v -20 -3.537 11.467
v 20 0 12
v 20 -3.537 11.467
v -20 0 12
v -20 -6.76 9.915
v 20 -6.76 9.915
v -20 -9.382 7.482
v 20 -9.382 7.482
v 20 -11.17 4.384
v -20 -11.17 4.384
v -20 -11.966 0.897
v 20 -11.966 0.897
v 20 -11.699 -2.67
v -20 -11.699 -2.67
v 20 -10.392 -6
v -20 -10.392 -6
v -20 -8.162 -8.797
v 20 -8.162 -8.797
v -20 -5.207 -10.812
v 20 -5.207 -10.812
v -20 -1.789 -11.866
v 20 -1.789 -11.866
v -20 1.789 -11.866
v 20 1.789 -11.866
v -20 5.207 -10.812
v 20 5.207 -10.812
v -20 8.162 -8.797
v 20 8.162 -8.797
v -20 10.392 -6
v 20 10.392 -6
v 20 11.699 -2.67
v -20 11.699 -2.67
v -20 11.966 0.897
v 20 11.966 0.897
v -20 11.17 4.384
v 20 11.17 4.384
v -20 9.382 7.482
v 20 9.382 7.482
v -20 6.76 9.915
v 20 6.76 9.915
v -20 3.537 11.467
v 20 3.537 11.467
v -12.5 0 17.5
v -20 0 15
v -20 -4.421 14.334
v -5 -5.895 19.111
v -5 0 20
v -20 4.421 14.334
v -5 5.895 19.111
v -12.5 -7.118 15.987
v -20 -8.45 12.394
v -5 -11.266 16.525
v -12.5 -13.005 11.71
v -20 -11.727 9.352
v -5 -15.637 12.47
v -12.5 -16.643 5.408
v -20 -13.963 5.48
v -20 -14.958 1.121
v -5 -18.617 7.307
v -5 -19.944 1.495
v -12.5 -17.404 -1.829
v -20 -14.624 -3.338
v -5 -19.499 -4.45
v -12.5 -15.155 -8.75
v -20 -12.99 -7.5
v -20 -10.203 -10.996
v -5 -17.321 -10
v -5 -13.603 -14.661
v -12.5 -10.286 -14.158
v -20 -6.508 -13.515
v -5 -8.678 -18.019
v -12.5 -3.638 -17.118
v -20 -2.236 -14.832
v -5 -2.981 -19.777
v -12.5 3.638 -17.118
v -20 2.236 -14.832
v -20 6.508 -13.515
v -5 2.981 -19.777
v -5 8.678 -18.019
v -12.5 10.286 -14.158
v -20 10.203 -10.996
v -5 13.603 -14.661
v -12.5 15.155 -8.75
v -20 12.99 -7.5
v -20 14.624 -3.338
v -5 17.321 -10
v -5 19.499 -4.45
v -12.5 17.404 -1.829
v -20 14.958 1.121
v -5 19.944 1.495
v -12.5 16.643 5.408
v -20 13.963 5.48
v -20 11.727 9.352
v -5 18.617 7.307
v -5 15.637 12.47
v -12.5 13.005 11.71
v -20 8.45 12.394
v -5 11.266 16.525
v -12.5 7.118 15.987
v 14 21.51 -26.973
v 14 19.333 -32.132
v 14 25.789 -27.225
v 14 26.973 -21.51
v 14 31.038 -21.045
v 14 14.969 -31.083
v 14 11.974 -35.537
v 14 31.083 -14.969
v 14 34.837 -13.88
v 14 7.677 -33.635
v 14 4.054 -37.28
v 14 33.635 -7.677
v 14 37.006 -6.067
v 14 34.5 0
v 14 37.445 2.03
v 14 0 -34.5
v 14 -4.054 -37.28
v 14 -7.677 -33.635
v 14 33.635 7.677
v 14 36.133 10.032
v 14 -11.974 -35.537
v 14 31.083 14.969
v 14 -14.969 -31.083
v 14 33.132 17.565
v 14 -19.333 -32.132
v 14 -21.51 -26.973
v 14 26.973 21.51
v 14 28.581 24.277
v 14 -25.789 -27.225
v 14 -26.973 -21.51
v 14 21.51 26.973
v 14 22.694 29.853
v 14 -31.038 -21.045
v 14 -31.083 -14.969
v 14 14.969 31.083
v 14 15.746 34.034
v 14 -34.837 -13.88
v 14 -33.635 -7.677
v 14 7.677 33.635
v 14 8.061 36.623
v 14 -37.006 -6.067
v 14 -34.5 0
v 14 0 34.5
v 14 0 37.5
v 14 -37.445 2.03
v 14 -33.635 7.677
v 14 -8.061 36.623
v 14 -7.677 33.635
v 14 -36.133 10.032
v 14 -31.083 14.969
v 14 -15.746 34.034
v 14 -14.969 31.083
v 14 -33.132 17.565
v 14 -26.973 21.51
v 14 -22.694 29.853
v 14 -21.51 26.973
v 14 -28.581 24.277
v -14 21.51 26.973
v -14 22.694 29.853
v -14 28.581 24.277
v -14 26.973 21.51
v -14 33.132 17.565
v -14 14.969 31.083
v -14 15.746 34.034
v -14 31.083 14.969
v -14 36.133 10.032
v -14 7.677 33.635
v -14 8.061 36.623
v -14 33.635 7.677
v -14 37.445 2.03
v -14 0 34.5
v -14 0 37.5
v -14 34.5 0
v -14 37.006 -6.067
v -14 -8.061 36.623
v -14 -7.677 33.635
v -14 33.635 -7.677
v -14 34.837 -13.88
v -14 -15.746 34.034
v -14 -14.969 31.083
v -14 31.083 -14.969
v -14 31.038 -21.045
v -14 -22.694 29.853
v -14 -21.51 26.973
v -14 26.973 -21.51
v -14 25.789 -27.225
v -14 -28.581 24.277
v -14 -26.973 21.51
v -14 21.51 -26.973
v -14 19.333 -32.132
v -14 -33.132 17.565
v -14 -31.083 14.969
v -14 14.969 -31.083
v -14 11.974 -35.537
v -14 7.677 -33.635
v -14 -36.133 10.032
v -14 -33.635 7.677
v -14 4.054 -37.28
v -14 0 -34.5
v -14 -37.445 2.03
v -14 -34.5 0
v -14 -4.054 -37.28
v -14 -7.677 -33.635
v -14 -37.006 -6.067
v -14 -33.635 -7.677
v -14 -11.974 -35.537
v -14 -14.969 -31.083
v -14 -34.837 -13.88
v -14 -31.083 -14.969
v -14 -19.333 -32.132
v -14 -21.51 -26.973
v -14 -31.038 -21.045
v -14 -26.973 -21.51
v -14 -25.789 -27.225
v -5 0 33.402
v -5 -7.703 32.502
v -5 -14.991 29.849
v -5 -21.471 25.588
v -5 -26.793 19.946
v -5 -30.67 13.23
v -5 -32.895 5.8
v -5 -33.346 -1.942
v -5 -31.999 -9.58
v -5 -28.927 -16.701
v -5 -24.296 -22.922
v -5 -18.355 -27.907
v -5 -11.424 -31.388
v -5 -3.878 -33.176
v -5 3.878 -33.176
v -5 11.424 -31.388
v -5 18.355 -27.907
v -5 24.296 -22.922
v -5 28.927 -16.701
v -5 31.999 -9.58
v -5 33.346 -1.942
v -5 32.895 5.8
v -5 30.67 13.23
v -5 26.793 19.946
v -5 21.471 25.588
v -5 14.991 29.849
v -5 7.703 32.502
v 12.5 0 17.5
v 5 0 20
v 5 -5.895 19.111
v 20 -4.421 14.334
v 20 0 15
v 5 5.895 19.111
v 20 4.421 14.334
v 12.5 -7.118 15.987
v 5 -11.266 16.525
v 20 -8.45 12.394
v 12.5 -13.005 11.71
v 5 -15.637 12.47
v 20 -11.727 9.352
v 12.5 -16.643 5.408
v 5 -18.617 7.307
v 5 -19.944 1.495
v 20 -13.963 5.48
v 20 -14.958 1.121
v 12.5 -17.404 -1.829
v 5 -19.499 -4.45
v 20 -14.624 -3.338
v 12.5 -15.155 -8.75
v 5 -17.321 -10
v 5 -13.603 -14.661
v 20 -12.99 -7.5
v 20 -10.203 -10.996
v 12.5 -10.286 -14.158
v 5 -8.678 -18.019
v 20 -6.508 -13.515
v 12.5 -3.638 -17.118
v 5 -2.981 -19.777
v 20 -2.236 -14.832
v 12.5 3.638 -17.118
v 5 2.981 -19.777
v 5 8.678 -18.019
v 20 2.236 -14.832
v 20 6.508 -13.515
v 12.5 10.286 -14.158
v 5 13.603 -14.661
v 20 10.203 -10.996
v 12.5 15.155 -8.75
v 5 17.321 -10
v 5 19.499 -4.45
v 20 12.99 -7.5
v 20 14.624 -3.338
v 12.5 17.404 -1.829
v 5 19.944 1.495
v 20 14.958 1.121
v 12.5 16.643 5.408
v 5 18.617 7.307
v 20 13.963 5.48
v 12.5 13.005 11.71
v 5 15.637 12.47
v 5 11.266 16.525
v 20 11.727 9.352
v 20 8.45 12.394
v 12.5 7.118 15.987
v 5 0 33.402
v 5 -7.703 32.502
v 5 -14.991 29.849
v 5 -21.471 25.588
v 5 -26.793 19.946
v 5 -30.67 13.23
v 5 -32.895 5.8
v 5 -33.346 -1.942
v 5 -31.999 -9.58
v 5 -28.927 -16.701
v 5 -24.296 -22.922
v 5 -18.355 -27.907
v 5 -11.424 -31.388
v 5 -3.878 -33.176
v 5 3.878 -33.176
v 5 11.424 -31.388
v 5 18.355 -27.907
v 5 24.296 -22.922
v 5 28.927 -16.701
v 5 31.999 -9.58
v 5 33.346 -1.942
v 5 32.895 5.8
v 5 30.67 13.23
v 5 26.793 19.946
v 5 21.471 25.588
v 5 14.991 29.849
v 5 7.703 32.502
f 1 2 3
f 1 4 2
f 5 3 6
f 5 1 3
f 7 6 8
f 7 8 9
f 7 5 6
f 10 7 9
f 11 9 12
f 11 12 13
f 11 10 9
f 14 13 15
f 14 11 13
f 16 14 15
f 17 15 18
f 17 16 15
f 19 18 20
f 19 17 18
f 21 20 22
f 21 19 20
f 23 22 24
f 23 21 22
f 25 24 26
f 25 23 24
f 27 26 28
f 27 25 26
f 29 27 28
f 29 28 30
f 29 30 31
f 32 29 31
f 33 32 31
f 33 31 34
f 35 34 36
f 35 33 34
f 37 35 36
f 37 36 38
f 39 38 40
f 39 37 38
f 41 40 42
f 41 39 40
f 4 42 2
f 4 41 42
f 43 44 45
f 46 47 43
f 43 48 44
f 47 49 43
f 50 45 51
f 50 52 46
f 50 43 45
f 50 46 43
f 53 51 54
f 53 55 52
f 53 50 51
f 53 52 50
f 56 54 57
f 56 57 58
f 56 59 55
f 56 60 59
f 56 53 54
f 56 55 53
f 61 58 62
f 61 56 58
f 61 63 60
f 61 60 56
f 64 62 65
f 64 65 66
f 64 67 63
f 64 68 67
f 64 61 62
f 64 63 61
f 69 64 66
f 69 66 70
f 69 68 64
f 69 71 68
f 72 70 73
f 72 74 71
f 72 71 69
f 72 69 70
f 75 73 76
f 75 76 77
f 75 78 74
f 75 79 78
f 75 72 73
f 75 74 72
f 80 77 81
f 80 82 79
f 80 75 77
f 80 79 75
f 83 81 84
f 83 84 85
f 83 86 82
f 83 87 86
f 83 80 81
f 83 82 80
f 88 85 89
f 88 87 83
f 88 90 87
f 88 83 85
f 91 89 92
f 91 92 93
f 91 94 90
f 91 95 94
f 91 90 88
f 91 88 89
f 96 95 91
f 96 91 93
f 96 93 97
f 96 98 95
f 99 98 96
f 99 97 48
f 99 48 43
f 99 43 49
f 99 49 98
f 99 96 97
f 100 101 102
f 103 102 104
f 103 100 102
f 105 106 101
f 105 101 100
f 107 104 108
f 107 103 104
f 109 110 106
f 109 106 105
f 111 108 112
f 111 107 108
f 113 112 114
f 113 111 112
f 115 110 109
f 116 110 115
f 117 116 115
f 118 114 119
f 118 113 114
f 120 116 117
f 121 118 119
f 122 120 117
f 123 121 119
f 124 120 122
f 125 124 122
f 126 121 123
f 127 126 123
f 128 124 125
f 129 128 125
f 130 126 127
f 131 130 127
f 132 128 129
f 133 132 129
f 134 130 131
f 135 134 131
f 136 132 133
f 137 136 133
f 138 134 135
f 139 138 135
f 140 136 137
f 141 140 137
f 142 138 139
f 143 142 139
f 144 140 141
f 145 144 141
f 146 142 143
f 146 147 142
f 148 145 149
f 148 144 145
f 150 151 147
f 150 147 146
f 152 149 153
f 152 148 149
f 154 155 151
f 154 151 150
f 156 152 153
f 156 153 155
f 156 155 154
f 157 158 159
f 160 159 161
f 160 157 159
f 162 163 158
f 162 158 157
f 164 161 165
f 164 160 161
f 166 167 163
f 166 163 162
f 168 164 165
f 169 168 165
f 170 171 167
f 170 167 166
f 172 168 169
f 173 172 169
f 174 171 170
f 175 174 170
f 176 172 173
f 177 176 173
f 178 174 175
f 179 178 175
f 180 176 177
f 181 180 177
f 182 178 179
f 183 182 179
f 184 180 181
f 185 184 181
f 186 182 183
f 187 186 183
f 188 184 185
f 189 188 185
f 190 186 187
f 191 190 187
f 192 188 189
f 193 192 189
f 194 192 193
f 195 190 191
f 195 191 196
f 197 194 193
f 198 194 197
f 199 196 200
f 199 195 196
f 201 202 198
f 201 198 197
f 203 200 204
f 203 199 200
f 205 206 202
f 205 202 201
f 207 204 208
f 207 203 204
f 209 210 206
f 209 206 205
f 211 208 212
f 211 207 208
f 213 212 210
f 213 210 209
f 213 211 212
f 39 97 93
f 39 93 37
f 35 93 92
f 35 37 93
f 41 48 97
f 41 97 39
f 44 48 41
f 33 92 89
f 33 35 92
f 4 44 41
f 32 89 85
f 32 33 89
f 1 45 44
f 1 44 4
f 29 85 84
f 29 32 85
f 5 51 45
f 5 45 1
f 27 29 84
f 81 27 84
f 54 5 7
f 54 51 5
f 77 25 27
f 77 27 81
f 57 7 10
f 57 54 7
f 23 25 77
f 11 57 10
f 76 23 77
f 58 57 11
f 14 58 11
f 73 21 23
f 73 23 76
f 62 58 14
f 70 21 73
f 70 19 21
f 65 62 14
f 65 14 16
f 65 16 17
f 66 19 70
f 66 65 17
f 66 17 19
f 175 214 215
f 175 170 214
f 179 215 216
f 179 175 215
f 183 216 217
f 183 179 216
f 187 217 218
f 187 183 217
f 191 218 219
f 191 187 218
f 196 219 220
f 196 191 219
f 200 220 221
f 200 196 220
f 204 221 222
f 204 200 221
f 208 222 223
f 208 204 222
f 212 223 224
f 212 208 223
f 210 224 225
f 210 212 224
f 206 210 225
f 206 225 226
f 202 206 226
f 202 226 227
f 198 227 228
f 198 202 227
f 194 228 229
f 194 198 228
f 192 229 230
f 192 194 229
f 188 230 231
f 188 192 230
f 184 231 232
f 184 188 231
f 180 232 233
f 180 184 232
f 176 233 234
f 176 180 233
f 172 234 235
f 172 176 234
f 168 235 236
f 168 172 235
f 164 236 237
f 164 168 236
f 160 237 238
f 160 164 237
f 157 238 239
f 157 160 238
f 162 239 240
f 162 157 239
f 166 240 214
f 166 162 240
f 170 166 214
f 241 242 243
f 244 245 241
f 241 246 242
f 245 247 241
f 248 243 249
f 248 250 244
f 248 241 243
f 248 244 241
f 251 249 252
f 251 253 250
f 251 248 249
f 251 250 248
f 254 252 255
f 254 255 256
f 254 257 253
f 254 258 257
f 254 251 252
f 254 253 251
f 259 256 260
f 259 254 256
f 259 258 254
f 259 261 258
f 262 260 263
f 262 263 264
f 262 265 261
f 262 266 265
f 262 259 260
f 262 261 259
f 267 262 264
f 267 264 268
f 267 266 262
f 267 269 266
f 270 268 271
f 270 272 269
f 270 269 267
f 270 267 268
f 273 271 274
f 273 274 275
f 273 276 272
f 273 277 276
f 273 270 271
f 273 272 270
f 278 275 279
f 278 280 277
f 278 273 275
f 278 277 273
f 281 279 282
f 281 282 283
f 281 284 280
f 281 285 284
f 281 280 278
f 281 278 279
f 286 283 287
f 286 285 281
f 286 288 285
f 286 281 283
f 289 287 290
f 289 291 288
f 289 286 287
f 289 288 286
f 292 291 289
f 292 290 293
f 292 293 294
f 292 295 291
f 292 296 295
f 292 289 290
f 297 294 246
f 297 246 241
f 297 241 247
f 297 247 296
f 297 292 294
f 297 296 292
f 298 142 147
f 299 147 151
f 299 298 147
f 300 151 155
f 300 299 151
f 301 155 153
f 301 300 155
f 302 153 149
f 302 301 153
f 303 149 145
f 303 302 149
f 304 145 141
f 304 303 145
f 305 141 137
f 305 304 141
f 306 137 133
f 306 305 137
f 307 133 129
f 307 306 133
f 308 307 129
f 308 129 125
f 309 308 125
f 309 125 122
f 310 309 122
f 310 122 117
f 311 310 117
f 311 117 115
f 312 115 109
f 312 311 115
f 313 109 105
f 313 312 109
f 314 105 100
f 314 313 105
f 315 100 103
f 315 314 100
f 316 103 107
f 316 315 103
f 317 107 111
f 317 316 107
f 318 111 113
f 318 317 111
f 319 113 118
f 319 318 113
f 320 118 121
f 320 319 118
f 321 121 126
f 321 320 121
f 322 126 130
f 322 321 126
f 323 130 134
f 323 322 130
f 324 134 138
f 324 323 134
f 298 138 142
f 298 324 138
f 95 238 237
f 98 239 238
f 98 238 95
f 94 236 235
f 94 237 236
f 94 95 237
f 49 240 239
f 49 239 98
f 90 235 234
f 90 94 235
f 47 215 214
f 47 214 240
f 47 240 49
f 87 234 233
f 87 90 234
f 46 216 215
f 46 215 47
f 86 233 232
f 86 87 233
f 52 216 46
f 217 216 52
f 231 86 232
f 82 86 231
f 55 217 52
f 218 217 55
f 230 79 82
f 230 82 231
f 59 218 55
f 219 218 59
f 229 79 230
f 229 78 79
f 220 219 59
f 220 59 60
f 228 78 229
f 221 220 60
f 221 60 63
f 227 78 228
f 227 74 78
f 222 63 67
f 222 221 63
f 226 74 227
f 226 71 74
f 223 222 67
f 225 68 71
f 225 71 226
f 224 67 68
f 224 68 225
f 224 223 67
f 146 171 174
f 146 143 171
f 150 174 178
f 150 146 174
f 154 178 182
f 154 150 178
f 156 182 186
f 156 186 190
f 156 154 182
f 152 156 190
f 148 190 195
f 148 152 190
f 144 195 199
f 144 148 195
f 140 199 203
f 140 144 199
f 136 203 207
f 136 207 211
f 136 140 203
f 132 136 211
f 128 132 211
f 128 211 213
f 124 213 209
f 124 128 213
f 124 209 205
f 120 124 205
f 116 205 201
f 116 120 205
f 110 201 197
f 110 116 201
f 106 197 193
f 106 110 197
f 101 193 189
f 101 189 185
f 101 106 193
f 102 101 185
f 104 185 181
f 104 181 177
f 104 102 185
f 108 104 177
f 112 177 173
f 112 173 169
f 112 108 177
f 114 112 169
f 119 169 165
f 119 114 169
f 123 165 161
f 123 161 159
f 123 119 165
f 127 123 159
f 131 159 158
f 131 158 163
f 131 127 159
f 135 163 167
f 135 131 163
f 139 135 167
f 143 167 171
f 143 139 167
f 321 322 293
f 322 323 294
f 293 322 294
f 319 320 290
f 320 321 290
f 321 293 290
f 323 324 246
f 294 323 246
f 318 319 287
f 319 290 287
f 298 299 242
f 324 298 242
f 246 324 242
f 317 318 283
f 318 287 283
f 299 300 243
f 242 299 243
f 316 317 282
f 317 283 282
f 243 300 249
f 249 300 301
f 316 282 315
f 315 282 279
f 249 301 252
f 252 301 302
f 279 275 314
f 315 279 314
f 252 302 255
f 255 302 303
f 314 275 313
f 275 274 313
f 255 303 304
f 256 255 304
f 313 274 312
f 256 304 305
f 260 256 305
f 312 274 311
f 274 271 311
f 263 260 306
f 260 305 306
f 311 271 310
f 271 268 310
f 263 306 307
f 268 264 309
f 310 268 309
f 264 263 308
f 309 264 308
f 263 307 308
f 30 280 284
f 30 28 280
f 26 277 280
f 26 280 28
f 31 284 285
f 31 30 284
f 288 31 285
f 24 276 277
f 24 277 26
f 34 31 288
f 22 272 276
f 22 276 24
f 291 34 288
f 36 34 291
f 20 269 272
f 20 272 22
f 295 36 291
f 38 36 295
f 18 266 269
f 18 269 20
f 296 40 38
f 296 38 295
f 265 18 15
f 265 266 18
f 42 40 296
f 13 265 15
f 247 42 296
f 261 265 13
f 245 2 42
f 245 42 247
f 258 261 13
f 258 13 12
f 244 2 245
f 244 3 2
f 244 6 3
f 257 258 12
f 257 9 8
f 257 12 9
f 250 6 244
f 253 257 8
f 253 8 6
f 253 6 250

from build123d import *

# Parameters (mm, degrees)
SKETCH2_W = 10
SKETCH2_H = 13.40221624


with BuildPart() as part:
    # Sketch2 → Revolve1 (revolve)
    with BuildSketch(Plane.XY, mode=Mode.PRIVATE) as revolve1_sk:
        Polygon((14, 34.5), (5, 33.40221624), (-5, 33.40221624), (-14, 34.5), (-14, 37.5), (14, 37.5), align=None)
        with Locations((0, 26.70110812)):
            Rectangle(SKETCH2_W, SKETCH2_H)
        Polygon((20, 15), (20, 12), (-20, 12), (-20, 15), (-5, 20), (5, 20), align=None)
    revolve(revolve1_sk.sketch.rotate(Axis((-33.658224077, 0, 0), (1, 0, 0)), 90), axis=Axis((-33.658224077, 0, 0), (1, 0, 0)))


solid = part.part
